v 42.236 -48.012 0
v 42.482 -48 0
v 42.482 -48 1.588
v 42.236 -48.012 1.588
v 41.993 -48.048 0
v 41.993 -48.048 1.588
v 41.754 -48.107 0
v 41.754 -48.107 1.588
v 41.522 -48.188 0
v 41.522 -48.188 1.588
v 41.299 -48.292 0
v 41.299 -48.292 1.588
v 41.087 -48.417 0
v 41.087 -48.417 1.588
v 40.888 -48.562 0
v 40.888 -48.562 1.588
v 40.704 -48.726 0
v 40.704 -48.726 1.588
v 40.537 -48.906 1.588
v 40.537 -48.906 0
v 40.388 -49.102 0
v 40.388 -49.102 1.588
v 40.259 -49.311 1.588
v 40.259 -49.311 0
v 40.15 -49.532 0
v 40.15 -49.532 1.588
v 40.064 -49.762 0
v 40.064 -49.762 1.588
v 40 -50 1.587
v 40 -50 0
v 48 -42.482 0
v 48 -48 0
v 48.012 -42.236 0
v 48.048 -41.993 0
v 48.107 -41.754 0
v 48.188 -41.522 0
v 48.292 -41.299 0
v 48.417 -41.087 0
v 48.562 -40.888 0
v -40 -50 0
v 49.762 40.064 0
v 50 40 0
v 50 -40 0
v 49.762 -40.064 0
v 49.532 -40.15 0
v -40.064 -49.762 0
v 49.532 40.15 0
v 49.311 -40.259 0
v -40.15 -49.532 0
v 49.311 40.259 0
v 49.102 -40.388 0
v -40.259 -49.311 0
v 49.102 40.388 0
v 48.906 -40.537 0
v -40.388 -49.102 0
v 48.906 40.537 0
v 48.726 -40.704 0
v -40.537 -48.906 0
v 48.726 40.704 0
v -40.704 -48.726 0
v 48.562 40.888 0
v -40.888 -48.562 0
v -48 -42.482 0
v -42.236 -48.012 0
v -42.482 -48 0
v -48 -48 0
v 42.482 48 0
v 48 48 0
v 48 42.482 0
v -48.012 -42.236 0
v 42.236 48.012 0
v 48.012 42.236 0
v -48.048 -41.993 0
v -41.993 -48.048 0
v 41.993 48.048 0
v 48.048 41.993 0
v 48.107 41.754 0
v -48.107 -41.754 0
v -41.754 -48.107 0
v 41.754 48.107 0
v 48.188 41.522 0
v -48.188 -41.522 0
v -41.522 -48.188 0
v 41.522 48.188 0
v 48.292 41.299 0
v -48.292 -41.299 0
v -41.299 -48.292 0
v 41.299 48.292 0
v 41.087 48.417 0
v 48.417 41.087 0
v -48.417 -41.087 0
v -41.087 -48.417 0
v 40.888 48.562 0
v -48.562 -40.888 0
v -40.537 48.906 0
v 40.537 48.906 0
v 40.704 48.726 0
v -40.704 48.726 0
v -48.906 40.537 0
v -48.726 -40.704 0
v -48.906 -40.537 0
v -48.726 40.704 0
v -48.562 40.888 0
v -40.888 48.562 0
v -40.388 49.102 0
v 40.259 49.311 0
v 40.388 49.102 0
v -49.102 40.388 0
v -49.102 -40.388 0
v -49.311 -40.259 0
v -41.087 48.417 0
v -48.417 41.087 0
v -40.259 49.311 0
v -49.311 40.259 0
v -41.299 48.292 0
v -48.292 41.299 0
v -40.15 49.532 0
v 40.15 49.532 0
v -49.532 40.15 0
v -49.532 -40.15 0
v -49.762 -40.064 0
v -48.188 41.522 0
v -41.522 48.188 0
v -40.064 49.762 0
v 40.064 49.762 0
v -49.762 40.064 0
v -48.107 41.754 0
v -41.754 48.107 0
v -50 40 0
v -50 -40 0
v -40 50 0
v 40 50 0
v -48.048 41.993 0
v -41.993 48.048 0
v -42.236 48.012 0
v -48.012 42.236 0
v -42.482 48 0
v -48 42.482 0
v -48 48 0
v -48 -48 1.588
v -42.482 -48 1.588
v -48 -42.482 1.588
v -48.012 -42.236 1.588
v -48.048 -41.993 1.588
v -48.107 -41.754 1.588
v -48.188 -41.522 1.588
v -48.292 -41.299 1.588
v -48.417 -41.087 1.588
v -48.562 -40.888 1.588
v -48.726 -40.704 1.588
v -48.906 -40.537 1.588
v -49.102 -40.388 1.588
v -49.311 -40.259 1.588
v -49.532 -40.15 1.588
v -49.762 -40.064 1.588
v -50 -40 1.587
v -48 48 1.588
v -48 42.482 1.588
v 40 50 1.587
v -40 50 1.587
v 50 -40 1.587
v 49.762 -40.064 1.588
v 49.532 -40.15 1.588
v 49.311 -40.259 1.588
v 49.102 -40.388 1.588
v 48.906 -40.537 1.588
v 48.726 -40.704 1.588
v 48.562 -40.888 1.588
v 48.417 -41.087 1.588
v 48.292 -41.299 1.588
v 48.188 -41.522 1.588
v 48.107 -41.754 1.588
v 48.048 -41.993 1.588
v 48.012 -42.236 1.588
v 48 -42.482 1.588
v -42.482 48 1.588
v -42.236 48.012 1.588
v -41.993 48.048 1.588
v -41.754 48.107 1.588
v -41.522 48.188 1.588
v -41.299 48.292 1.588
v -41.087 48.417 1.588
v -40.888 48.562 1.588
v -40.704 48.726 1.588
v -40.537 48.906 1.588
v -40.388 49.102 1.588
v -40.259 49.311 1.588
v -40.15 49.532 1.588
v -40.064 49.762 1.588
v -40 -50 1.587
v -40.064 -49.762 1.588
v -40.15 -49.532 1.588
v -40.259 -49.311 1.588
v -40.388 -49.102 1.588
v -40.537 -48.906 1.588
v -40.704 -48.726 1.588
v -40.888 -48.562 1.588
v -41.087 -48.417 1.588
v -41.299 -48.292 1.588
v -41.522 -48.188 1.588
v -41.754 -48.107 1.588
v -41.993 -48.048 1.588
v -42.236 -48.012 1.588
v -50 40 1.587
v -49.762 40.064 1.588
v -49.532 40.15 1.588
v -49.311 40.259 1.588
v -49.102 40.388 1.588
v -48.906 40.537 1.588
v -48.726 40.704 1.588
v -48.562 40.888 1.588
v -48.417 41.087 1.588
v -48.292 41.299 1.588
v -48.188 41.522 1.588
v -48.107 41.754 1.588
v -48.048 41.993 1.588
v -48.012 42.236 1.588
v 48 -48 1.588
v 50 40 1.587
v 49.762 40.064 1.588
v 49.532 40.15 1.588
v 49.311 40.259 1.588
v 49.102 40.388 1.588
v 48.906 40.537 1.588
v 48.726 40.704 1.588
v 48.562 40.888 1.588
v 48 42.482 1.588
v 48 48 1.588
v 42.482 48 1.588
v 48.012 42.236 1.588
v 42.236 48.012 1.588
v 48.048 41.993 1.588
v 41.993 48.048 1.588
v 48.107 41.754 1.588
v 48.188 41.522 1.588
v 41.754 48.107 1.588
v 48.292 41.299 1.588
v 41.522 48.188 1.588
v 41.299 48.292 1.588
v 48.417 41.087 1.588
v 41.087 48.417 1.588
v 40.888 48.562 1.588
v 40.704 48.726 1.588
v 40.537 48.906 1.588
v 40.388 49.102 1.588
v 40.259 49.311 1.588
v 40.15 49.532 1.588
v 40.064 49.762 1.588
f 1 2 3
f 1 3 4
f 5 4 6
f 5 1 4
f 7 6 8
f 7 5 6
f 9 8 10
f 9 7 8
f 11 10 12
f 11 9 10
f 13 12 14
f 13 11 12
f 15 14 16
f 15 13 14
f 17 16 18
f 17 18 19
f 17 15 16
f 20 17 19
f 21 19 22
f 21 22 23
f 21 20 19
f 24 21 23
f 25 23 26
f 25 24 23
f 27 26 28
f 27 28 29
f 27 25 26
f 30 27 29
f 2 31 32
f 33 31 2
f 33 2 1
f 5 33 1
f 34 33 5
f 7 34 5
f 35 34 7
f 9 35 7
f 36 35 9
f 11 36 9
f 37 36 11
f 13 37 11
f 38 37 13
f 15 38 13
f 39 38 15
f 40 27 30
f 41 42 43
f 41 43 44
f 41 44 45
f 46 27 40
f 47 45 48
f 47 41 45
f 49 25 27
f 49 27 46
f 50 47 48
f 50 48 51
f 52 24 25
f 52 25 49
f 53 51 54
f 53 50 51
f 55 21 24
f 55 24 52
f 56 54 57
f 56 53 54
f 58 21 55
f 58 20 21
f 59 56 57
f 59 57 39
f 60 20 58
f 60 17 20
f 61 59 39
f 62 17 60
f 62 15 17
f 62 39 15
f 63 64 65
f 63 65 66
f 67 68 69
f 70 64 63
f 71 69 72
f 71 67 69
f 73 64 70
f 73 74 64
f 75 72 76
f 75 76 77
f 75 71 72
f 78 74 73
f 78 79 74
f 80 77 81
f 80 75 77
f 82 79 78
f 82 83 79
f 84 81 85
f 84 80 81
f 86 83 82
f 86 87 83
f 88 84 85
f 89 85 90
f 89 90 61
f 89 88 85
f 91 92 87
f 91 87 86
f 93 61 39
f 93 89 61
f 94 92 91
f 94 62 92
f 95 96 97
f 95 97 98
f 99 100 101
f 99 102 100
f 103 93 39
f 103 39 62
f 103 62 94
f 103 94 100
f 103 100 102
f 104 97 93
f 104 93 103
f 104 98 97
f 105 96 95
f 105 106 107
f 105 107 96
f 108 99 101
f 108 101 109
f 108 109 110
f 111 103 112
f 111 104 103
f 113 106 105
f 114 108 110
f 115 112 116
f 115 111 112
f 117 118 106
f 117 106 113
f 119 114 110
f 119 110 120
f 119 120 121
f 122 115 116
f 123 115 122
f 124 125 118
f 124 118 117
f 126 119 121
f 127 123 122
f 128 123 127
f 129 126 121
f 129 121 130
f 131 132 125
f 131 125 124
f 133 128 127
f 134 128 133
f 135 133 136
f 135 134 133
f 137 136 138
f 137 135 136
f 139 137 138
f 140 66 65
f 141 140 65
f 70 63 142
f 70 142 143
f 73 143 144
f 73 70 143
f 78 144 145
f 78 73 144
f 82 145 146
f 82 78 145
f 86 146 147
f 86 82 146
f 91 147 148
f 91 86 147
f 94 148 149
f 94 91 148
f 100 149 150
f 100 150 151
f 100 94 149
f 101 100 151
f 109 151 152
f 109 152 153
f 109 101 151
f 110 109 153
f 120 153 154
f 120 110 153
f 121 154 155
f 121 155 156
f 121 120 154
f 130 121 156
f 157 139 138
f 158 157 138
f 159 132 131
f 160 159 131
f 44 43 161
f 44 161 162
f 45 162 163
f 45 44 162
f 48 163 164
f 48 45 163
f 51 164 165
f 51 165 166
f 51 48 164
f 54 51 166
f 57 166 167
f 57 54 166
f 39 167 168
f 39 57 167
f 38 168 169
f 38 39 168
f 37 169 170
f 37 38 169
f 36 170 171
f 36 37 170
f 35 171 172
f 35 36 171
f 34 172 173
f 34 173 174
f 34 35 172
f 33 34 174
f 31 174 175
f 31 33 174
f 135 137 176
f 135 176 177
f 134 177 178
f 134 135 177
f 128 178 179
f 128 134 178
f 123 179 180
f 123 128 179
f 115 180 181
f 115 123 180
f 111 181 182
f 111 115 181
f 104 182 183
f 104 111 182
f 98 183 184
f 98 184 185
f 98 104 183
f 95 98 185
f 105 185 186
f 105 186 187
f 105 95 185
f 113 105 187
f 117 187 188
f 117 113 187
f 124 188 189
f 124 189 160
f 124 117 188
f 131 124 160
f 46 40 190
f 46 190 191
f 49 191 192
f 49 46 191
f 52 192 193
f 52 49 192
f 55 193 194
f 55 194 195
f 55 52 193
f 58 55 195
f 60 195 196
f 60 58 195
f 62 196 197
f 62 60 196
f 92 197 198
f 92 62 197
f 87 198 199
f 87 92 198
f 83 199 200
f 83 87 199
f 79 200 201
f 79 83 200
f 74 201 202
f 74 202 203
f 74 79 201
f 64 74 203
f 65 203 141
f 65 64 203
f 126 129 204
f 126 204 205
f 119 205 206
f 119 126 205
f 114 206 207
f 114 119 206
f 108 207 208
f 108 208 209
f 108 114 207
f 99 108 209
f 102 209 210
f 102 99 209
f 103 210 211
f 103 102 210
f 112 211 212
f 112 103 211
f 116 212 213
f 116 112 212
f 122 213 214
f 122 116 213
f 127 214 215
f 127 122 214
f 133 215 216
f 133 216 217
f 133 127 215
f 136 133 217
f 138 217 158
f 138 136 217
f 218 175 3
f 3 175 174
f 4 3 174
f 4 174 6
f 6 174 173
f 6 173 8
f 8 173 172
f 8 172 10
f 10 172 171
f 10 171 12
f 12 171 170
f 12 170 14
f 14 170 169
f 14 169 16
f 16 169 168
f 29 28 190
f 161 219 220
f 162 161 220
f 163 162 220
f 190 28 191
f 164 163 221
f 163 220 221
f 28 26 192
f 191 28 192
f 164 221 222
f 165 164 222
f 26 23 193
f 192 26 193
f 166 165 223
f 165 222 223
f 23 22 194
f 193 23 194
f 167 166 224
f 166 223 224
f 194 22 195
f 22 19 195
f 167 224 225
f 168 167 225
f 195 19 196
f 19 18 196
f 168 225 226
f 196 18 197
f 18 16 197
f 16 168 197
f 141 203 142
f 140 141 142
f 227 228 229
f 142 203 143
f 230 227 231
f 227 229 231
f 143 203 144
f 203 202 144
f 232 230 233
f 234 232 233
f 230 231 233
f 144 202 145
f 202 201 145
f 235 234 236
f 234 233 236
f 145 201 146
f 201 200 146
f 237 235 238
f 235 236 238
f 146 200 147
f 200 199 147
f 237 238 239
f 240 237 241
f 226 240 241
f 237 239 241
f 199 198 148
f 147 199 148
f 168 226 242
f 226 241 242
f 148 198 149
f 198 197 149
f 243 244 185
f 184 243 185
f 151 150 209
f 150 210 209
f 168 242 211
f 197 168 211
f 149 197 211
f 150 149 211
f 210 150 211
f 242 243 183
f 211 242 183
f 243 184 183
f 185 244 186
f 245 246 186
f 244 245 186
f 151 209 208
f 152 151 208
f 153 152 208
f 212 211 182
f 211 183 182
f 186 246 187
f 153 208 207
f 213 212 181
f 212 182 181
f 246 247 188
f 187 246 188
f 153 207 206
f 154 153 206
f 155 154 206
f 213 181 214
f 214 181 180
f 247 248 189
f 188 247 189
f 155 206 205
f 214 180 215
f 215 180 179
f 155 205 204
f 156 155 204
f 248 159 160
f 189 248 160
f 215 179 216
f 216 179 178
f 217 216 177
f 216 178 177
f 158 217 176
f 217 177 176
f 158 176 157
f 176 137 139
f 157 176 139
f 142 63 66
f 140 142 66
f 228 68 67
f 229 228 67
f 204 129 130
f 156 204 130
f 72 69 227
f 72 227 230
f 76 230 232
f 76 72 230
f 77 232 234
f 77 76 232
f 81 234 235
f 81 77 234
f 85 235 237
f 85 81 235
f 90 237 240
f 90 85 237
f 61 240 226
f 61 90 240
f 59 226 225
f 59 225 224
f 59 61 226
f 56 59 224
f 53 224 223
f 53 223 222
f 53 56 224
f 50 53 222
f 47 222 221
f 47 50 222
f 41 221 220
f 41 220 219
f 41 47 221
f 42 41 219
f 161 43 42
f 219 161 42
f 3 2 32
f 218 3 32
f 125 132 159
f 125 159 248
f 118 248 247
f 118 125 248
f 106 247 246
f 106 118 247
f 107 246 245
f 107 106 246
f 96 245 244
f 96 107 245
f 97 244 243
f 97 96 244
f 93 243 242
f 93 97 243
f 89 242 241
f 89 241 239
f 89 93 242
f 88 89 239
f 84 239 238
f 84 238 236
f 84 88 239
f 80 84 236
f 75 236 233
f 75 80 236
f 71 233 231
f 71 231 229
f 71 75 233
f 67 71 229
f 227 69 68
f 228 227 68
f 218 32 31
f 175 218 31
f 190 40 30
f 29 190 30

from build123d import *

# Parameters (mm, degrees)
BOSS_EXTRUDE1_DEPTH = 1.5875
FILLET1_R           = 2.54


with BuildPart() as part:
    # Sketch1 → Boss-Extrude1 (new body)
    with BuildSketch(Plane.XY):
        Polygon((40, 50), (-40, 50), (-40, 48), (-48, 48), (-48, 40), (-50, 40), (-50, -37.864895224), (-50, -40), (-48, -40), (-48, -48), (-40, -48), (-40, -50), (-37.864895224, -50), (40, -50), (40, -48), (48, -48), (48, -40), (50, -40), (50, 40), (48, 40), (48, 48), (40, 48), align=None)
    extrude(amount=BOSS_EXTRUDE1_DEPTH)

    # Fillet1
    # the kernel refuses this fillet: 2.54 mm, written as the material it adds along each edge
    with BuildSketch(Plane(origin=(-48, -40, 0), x_dir=(0, -1, 0), z_dir=(0, 0, 1)), Plane(origin=(40, -48, 0), x_dir=(1, 0, 0), z_dir=(0, 0, 1)), Plane(origin=(48, 40, 0), x_dir=(0, 1, 0), z_dir=(0, 0, 1)), Plane(origin=(-40, 48, 0), x_dir=(-1, 0, 0), z_dir=(0, 0, 1))) as fillet1_piece_1:
        with BuildLine():
            CenterArc((2.481934729, -2.54), FILLET1_R, 90, 77.725329785)
            Line((0, -2), (-0.049638695, -1.9892))
            ThreePointArc((-0.049638695, -1.9892), (-0.0508, -1), (-0.0508, 0))
            Line((-0.0508, 0), (0, 0.0508))
            Line((0, 0.0508), (2.481934729, 0.0508))
            Line((2.481934729, 0.0508), (2.481934729, 0))
        make_face()
    extrude(amount=1.5875)
    with BuildSketch(Plane(origin=(-40, -48, 0), x_dir=(-3.737454790095179e-12, -1.0, 0), z_dir=(0, 0, 1)), Plane(origin=(48, -40, 0), x_dir=(1.0, -3.7339020764163554e-12, 0), z_dir=(0, 0, 1)), Plane(origin=(-48, 40, 0), x_dir=(-1.0, 3.737454790095126e-12, 0), z_dir=(0, 0, 1))) as fillet1_piece_2:
        with BuildLine():
            CenterArc((2.54, -2.481934729), FILLET1_R, 102.274670215, 77.725329785)
            Line((0, -2.481934729), (-0.0508, -2.481934729))
            Line((-0.0508, -2.481934729), (-0.0508, 0))
            Line((-0.0508, 0), (0, 0.0508))
            ThreePointArc((0, 0.0508), (1, 0.0508), (1.9892, 0.049638695))
            Line((1.9892, 0.049638695), (2, 0))
        make_face()
    extrude(amount=1.5875)
    with BuildSketch(Plane(origin=(40, 48, 0), x_dir=(1, 0, 0), z_dir=(0, 0, 1))) as fillet1_piece_3:
        with BuildLine():
            CenterArc((2.481934729, 2.54), FILLET1_R, 192.274670215, 77.725329785)
            Line((0, 2), (-0.049638695, 1.9892))
            ThreePointArc((-0.049638695, 1.9892), (-0.0508, 1), (-0.0508, 0))
            Line((-0.0508, 0), (0, -0.0508))
            Line((0, -0.0508), (2.481934729, -0.0508))
            Line((2.481934729, -0.0508), (2.481934729, 0))
        make_face()
    extrude(amount=1.5875)


solid = part.part
